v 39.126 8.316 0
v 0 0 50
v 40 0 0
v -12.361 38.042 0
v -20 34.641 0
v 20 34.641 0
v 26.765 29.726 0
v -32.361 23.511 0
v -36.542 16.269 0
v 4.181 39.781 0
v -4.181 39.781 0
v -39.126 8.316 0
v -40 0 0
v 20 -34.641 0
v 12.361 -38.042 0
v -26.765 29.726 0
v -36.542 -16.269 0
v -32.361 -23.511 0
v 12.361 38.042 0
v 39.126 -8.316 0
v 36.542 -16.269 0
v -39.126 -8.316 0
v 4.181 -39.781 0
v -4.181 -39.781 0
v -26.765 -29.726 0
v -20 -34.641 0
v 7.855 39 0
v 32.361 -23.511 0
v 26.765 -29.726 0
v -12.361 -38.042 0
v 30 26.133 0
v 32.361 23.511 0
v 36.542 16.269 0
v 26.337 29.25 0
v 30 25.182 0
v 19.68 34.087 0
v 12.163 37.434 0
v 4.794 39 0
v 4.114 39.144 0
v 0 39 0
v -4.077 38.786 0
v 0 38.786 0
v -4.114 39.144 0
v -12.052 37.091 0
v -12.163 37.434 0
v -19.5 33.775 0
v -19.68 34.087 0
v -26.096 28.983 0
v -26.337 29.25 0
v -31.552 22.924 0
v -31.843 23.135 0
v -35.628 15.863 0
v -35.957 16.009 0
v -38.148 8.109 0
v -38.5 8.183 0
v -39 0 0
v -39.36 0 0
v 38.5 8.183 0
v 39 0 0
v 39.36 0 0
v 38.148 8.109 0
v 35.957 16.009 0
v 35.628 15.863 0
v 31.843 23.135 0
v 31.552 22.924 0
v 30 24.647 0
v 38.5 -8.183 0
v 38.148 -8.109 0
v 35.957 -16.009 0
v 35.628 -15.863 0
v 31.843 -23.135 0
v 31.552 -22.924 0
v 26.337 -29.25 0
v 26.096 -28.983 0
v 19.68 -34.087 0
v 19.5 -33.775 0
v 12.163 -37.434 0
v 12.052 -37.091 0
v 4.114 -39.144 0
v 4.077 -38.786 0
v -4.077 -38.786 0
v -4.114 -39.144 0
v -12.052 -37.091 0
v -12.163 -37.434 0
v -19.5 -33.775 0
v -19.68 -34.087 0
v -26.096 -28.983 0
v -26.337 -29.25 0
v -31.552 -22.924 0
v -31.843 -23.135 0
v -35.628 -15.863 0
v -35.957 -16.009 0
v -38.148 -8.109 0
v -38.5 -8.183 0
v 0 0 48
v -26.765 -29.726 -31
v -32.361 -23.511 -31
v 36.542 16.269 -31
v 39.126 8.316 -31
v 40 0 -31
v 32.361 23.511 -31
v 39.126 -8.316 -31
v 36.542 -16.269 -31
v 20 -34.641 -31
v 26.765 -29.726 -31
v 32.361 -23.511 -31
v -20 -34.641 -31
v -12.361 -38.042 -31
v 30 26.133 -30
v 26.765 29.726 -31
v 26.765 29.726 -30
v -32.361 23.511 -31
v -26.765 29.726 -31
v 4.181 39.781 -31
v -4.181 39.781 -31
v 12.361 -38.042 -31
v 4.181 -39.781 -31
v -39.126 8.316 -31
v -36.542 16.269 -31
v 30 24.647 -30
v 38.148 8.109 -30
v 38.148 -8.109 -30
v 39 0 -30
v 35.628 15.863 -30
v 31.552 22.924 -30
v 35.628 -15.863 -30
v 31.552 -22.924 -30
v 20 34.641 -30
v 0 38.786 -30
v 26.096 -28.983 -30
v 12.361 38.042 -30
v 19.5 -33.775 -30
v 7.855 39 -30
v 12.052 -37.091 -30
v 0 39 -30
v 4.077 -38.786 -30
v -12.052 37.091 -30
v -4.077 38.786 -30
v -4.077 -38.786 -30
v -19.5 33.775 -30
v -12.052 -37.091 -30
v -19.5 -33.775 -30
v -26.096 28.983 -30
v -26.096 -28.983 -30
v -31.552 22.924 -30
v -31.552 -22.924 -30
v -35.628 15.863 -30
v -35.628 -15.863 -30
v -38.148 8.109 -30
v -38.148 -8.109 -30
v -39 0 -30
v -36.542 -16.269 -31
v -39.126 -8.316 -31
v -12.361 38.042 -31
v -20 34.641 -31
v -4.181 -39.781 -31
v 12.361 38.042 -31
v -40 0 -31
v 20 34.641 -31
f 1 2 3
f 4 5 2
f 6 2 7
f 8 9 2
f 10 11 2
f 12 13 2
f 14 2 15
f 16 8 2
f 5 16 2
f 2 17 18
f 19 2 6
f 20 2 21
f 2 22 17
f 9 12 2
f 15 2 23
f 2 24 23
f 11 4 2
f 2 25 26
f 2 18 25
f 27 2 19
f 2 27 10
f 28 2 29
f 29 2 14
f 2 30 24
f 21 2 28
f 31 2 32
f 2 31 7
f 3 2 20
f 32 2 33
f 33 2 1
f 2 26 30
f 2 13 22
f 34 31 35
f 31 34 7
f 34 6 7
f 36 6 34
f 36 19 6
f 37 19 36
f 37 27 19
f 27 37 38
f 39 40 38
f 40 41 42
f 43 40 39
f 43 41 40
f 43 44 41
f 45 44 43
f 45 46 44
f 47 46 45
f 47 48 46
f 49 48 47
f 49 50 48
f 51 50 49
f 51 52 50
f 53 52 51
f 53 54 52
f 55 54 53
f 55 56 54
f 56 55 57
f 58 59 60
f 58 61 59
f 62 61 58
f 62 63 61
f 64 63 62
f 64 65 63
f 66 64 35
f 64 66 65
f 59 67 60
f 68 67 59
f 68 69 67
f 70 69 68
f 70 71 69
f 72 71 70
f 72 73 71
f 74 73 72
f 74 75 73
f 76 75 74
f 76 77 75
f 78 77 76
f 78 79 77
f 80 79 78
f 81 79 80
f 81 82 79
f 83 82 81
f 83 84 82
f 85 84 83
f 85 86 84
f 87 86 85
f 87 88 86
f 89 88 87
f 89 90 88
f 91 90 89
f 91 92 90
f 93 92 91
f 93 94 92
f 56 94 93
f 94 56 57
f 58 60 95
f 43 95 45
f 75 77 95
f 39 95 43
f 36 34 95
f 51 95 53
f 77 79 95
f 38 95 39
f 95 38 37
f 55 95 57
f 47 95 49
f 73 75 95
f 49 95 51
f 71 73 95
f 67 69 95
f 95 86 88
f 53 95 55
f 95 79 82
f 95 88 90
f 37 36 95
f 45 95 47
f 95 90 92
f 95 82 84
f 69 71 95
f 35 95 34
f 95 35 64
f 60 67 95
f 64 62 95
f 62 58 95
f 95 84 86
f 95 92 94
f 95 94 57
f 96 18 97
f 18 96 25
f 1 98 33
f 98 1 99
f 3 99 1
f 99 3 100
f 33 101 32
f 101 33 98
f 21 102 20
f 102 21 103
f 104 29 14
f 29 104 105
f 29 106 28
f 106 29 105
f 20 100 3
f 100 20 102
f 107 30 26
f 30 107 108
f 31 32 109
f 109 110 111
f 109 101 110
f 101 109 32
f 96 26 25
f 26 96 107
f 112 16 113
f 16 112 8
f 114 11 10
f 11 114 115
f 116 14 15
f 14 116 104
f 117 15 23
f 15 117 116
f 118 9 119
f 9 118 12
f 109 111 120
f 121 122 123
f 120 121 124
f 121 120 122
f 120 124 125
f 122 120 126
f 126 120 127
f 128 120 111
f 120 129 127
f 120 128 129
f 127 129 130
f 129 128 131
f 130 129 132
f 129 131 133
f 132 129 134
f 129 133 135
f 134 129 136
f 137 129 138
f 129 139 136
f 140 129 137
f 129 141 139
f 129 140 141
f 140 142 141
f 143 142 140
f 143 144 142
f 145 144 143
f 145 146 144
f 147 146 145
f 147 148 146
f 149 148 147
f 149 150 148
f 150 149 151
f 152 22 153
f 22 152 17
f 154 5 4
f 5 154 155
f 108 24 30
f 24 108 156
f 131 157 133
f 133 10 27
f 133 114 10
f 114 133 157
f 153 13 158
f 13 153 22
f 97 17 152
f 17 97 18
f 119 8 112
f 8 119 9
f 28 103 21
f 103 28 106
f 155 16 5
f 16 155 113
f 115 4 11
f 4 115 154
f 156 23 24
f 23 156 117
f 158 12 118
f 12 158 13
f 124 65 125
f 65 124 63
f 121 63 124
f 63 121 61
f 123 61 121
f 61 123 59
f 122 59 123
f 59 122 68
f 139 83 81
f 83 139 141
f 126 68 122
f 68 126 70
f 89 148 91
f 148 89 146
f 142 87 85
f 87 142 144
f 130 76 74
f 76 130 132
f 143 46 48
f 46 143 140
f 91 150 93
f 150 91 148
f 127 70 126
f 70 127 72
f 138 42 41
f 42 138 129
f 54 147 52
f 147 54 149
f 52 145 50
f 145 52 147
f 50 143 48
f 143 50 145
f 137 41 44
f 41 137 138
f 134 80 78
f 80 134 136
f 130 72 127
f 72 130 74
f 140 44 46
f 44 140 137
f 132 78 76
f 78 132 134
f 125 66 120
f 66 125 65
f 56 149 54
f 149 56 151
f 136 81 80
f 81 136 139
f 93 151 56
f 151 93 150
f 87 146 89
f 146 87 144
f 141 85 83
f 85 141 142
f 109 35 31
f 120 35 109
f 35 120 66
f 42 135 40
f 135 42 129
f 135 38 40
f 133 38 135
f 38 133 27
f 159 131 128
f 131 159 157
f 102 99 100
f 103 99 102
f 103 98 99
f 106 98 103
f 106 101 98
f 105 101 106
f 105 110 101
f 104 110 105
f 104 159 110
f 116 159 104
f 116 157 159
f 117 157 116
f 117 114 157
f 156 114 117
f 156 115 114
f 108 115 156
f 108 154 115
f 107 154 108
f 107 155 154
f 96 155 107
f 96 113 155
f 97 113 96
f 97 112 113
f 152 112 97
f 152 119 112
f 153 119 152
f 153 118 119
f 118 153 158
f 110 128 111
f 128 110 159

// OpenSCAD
difference () {
cylinder (50, 40, 0);
translate ([0, 0, -2])cylinder (50, 41, 0);
}
difference () { 
translate ([0, 0, -30])cylinder (30, 40, 40);
translate ([0, 0, -31])cylinder (34, 39, 39);
translate ([0, 0, -33])cube ([30, 39, 39]);
}
translate ([0, 0, -31])cylinder (1, 40, 40);
